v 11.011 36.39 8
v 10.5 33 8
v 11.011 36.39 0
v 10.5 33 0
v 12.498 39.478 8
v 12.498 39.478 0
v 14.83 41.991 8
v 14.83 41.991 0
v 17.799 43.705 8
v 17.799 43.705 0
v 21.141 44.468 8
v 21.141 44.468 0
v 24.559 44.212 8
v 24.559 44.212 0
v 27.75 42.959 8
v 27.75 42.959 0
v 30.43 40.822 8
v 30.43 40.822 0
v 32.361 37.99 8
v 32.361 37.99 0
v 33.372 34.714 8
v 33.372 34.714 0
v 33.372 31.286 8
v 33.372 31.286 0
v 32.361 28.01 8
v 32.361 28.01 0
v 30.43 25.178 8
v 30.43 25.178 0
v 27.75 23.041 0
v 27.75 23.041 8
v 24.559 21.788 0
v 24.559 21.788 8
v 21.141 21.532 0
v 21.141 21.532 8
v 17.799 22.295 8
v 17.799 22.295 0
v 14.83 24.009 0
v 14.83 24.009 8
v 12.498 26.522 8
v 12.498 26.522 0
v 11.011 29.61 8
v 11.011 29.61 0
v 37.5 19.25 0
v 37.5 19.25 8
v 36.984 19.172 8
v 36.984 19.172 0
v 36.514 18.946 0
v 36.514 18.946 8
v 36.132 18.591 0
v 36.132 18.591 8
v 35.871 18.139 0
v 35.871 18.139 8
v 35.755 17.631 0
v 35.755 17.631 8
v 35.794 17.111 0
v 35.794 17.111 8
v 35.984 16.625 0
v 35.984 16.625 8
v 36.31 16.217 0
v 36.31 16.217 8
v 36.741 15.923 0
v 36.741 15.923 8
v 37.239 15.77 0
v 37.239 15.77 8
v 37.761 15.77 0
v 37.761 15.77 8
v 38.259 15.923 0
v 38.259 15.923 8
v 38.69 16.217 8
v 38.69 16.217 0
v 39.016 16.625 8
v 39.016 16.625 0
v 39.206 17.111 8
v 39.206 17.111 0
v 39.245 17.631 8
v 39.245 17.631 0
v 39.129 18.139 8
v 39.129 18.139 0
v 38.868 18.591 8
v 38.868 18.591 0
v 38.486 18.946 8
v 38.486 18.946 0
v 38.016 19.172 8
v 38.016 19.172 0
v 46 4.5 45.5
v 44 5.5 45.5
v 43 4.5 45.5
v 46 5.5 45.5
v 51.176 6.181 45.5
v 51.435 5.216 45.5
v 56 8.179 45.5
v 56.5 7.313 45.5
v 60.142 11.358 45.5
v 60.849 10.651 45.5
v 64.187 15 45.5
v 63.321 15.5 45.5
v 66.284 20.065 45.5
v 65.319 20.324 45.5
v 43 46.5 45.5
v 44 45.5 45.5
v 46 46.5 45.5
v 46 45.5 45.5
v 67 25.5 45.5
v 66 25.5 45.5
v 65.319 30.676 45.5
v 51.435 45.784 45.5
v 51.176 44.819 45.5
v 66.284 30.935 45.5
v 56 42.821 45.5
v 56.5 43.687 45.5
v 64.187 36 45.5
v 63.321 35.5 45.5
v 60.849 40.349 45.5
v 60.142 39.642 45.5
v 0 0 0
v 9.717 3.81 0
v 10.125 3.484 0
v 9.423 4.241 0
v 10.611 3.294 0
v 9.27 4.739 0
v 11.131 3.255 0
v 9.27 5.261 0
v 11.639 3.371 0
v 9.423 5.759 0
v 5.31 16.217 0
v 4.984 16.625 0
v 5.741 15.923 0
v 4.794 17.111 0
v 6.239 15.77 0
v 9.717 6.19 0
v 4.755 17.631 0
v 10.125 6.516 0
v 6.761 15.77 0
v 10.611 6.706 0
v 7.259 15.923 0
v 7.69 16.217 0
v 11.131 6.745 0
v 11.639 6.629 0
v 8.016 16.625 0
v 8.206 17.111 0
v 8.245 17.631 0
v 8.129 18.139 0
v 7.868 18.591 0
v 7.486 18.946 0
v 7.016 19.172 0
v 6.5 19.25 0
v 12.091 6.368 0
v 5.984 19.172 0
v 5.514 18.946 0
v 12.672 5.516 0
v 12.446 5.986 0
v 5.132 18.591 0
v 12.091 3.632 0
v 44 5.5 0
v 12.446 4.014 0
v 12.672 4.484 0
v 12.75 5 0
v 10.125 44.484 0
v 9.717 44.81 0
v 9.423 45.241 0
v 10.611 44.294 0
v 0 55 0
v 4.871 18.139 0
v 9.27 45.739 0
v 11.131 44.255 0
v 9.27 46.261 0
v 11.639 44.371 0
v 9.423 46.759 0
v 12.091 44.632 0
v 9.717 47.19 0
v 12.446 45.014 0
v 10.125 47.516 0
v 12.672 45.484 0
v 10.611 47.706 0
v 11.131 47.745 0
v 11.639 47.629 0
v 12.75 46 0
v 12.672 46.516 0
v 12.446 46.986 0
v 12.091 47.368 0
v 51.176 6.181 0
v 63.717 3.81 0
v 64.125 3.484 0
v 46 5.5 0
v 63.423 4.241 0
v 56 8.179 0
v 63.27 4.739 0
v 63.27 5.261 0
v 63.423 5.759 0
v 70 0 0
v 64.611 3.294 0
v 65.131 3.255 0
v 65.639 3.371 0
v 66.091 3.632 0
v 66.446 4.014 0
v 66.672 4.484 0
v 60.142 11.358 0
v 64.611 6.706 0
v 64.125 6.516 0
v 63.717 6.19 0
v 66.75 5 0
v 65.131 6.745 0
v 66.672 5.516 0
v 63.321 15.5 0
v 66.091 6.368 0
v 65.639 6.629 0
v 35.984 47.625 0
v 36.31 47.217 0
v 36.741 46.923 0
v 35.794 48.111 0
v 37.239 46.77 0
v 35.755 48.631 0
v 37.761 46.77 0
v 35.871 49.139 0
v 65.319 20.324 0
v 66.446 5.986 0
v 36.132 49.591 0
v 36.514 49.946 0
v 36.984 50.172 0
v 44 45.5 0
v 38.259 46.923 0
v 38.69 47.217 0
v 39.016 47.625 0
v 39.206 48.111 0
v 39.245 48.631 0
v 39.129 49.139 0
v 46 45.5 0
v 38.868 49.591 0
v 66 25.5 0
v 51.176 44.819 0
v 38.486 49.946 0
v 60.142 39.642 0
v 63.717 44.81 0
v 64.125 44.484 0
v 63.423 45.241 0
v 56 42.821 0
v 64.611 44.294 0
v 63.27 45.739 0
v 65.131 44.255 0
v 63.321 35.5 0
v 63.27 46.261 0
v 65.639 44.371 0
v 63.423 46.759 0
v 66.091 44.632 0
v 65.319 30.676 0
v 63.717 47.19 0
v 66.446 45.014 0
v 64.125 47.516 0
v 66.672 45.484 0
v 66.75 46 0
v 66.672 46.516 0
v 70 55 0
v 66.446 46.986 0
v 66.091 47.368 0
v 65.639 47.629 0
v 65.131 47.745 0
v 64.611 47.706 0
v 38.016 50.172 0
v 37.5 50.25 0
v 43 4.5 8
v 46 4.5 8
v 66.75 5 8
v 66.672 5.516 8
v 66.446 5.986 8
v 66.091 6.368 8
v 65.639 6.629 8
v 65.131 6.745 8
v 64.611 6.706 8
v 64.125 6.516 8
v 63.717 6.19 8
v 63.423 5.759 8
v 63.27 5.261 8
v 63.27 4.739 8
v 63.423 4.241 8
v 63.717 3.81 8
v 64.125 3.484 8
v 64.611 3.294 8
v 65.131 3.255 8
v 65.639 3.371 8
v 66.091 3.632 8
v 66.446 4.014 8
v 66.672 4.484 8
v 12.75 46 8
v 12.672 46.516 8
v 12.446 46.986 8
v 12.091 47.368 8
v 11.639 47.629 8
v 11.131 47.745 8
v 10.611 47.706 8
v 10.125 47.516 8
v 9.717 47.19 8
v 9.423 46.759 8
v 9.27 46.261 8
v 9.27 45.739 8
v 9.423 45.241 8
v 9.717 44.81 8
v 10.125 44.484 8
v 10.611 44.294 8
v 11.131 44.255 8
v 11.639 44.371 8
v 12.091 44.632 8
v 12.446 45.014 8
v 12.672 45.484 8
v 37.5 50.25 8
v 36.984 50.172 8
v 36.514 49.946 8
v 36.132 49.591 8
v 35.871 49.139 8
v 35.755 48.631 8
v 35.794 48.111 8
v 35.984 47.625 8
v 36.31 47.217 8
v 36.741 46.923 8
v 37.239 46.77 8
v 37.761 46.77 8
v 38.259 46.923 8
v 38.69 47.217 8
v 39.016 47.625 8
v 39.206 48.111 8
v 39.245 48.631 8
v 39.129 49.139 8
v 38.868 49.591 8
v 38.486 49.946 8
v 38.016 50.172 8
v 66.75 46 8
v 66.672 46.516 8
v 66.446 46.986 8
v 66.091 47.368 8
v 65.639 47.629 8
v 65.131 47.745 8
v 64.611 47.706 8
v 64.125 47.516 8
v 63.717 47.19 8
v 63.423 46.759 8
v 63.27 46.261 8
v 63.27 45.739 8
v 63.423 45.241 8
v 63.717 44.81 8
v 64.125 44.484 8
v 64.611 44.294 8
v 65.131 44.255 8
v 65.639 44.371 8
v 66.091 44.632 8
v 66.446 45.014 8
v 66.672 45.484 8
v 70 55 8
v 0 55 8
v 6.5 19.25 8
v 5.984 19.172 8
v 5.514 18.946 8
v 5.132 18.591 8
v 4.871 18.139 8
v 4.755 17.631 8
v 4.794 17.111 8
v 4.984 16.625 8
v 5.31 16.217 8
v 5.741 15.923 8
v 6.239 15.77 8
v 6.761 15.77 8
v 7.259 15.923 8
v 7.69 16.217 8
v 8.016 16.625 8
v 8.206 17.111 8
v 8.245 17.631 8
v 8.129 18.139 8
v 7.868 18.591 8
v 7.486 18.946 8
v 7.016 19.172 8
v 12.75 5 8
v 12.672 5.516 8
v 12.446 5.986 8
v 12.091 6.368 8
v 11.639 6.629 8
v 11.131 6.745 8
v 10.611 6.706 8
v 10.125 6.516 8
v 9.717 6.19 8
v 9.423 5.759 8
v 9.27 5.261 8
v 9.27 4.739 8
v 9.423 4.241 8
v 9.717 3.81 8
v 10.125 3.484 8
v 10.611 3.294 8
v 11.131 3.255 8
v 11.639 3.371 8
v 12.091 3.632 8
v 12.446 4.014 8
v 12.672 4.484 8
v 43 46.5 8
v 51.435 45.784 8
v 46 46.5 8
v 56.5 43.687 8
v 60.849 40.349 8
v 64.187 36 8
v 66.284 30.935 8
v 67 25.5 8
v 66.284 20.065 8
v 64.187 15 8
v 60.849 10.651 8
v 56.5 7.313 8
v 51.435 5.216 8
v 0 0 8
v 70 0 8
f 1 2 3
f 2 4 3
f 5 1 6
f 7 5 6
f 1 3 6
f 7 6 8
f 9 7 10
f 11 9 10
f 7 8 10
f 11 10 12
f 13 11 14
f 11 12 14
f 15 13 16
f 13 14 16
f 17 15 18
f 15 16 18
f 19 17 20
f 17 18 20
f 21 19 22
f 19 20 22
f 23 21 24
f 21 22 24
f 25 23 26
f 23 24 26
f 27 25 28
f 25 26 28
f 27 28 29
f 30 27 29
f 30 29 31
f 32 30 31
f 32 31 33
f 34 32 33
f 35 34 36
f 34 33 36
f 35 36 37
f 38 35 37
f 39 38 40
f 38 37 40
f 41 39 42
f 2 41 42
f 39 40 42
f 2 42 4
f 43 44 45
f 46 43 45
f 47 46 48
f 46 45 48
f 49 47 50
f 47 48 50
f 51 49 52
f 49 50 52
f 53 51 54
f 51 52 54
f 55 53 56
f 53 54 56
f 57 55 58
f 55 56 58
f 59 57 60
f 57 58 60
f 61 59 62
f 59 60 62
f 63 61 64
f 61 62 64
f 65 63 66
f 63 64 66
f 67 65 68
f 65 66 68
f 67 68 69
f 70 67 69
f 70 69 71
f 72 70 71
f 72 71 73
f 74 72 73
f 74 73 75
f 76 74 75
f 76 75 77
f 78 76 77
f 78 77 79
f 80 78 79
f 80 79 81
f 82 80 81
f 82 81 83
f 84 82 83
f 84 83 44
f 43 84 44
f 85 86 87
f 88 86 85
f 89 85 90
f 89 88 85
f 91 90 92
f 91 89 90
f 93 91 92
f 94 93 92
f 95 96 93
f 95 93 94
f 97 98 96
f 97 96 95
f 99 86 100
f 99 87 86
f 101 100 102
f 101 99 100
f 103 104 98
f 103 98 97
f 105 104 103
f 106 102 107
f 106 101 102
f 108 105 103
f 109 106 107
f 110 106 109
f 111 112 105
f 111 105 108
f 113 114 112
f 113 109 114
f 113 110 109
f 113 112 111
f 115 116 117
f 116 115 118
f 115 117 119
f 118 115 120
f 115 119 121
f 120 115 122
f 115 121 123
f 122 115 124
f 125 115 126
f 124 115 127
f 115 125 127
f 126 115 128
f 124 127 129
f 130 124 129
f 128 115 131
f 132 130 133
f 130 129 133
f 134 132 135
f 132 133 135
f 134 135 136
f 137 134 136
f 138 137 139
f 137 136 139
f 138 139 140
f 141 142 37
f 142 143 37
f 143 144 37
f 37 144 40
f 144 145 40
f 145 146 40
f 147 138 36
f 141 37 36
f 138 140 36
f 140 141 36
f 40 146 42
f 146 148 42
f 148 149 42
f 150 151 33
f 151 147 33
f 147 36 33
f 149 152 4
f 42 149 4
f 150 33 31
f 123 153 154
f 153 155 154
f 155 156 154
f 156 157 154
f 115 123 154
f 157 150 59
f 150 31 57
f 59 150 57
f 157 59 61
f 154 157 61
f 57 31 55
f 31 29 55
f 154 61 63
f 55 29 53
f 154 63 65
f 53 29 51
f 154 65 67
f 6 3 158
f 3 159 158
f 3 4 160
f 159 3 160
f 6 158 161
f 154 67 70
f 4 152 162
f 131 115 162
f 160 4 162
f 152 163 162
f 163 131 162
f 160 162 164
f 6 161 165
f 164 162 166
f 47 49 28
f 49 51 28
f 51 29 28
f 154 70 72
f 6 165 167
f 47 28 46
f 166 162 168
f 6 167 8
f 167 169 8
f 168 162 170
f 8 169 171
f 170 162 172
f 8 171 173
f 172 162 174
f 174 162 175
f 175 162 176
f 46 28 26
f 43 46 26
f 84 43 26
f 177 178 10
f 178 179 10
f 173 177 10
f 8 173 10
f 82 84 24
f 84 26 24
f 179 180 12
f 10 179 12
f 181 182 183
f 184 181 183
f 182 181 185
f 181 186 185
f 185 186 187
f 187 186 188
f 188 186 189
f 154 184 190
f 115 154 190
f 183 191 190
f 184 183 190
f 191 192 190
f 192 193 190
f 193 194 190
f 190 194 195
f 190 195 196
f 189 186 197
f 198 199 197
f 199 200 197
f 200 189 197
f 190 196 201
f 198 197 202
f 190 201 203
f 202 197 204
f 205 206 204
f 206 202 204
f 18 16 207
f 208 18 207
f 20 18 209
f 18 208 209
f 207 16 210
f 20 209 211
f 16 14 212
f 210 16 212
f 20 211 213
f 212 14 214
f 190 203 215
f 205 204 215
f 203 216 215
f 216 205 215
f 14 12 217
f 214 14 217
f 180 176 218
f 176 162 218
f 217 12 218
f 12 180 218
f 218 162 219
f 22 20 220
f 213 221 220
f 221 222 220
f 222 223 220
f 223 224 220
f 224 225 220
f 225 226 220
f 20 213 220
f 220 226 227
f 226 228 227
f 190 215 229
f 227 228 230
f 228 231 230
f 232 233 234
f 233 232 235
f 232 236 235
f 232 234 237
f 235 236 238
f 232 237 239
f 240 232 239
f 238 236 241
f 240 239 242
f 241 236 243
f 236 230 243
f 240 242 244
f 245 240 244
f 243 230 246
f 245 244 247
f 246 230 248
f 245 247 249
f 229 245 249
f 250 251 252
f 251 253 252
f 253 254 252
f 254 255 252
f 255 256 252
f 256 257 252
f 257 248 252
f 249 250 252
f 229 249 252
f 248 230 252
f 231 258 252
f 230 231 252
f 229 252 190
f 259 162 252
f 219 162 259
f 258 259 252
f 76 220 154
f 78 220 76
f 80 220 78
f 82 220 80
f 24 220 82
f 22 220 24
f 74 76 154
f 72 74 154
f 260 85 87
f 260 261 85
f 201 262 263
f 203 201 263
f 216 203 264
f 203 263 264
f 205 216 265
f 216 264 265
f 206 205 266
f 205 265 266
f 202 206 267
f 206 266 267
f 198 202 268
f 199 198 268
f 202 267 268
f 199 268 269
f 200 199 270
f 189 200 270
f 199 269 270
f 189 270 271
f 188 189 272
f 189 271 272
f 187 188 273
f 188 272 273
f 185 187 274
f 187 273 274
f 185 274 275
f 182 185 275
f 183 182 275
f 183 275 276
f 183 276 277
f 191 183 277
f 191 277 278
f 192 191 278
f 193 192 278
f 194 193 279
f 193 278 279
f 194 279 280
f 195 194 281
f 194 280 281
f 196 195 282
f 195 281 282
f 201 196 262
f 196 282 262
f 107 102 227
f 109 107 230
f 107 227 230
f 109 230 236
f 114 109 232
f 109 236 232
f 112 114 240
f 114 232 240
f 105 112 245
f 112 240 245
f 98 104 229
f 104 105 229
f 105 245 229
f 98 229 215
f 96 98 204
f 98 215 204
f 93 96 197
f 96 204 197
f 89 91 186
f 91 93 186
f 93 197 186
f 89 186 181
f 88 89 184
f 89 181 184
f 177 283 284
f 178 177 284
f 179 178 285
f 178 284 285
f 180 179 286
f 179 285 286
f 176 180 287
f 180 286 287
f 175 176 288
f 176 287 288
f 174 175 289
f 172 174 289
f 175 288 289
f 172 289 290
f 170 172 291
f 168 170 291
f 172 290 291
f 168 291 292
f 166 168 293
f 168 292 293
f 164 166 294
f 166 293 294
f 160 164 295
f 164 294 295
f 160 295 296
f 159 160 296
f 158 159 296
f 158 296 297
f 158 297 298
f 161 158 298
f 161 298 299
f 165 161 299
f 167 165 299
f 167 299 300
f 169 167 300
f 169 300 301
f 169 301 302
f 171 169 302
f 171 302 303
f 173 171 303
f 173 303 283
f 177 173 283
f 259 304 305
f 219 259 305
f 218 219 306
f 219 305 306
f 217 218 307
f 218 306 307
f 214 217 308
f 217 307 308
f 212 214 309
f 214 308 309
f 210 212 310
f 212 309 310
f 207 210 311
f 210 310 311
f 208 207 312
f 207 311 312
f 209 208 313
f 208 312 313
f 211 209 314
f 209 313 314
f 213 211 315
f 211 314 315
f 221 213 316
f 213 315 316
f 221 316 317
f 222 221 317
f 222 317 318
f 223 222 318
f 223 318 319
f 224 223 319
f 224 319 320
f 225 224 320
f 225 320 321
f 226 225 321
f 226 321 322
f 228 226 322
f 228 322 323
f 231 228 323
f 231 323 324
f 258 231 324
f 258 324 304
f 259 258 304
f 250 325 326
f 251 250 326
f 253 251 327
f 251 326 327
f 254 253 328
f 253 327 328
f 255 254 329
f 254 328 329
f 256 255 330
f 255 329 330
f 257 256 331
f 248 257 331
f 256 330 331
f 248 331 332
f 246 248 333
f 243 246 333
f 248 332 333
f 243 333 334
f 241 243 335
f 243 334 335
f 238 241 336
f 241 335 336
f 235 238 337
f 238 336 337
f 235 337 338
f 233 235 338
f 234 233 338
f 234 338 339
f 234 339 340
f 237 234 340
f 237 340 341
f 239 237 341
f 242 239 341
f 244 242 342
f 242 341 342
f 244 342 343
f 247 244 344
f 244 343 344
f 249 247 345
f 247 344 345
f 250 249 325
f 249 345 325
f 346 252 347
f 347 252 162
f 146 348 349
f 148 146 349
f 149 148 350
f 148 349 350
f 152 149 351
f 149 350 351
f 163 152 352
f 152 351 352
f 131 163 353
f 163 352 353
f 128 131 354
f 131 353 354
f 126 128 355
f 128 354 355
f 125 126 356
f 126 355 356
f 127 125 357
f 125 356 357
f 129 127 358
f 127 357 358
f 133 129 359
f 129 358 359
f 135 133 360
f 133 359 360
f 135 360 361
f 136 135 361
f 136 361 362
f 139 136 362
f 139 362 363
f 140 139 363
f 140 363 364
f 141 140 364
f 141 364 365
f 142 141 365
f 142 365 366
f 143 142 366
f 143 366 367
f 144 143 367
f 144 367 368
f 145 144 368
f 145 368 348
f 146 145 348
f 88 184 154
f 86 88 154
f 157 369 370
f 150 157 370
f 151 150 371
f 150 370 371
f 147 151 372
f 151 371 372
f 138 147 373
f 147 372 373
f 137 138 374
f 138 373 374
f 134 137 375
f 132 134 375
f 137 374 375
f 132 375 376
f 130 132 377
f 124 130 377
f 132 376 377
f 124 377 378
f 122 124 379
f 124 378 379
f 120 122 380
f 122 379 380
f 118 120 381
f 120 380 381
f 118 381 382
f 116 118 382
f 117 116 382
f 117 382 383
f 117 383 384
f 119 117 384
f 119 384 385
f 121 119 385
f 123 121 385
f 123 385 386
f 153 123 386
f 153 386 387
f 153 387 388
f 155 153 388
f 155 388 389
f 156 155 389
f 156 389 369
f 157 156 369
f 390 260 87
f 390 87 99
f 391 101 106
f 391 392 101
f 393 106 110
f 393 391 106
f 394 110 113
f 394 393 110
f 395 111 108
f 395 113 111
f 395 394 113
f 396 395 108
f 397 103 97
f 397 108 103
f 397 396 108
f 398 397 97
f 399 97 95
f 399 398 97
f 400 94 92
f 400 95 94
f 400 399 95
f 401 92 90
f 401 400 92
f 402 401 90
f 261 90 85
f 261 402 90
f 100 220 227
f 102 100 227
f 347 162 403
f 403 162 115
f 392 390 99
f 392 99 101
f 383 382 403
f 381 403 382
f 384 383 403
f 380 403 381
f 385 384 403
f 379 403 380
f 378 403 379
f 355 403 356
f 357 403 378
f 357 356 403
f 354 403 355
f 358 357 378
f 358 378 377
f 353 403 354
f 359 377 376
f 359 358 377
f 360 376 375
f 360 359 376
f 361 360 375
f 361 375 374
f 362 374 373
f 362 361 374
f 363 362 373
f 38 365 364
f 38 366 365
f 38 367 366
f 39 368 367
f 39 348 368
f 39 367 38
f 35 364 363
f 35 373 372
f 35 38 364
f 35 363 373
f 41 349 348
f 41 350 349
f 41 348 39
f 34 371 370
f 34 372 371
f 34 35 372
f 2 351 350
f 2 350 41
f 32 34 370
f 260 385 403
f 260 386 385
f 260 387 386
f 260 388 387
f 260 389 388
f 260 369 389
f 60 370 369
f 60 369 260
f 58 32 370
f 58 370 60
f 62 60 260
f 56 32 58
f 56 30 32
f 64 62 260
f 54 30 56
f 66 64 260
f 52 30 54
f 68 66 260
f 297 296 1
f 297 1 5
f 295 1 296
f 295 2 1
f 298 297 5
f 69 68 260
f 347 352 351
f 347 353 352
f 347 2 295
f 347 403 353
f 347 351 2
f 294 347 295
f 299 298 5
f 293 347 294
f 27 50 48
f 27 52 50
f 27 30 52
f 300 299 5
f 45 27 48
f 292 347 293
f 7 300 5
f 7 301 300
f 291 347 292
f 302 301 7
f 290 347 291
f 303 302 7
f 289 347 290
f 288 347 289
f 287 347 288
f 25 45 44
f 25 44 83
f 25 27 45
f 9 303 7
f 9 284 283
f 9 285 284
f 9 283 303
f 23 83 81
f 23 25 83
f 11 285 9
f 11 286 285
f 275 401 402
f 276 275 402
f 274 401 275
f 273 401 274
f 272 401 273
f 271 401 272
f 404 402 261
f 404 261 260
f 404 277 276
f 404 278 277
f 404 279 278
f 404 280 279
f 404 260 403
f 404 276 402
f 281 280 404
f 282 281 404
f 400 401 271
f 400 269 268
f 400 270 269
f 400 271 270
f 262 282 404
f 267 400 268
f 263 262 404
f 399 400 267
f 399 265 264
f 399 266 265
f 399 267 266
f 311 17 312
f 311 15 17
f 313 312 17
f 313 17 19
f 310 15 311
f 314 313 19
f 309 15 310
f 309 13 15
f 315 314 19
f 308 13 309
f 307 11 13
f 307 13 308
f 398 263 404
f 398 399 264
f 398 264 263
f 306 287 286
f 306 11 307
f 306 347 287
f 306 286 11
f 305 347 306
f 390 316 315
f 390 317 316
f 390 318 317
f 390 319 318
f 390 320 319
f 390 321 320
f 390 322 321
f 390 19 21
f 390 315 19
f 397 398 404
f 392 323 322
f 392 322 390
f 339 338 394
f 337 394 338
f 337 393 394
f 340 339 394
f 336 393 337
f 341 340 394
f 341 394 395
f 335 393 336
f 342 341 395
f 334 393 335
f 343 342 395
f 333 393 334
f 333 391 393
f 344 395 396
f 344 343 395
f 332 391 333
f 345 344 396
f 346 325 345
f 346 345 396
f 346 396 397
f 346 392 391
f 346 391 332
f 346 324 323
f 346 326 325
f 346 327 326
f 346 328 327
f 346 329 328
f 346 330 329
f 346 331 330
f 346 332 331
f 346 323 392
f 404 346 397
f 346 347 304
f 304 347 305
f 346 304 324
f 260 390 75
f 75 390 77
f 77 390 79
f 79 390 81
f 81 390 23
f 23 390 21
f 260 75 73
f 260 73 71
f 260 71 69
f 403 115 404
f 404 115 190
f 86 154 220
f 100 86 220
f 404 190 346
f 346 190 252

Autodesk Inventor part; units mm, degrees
ref_plane "YZ Plane" through (0, 0, 0) normal (1, 0, 0) x (0, 1, 0)
ref_plane "XZ Plane" through (0, 0, 0) normal (0, 1, 0) x (-1, 0, 0)
ref_plane "XY Plane" through (0, 0, 0) normal (0, 0, 1) x (1, 0, 0)
sketch "Sketch1" plane through (0, 0, 0) normal (0, 0, 1) x (1, 0, 0)
  line L0 (0, 0) -> (70, 0)
  line L1 (70, 0) -> (70, 55)
  line L2 (70, 55) -> (0, 55)
  line L3 (0, 55) -> (0, 0)
  dimension "d0" = 70
  dimension "d1" = 55
extrude "Extrusion1" add sketch "Sketch1" along normal blind 8
sketch "Sketch2" plane through (0, 0, 8) normal (0, 0, 1) x (1, 0, 0)
  circle A0 centre (11, 5) radius 1.75
  circle A1 centre (65, 5) radius 1.75
  circle A2 centre (11, 46) radius 1.75
  circle A3 centre (65, 46) radius 1.75
  line L0 (0, 55) -> (0, 0) projected
  line L1 (0, 0) -> (70, 0) projected
  line L2 (70, 55) -> (0, 55) projected
  line L3 (70, 0) -> (70, 55) projected
  dimension "d4" = 3.5
  dimension "d5" = 3.5
  dimension "d6" = 3.5
  dimension "d7" = 3.5
  dimension "d8" = 11
  dimension "d9" = 5
  dimension "d10" = 9
  dimension "d11" = 5
extrude "Extrusion2" cut sketch "Sketch2" against normal blind 40 contours A0 | A1 | A2 | A3
sketch "Sketch3" plane through (0, 0, 0) normal (0, 0, -1) x (-1, 0, 0)
  circle A0 centre (-22, 33) radius 11.5
  line L0 (0, 55) -> (0, 0) projected
  line L1 (-70, 55) -> (0, 55) projected
  dimension "d14" = 23
  dimension "d15" = 22
  dimension "d16" = 22
extrude "Extrusion3" cut sketch "Sketch3" against normal blind 35
sketch "Sketch4" plane through (0, 0, 0) normal (0, 0, -1) x (-1, 0, 0)
  circle A0 centre (-22, 33) radius 11.5 projected
  point P0 (0, 0)
  point P1 (-6.5, 48.5)
  point P2 (-37.5, 48.5)
  point P3 (-37.5, 17.5)
  point P4 (-6.5, 17.5)
  dimension "d19" = 15.5
  dimension "d20" = 15.5
  dimension "d21" = 15.5
  dimension "d22" = 15.5
hole "Hole1" at (6.5, 17.5, 0) at (37.5, 17.5, 0) at (37.5, 48.5, 0) direction (0, 0, 1) diameter 3.5 end through all
sketch "Sketch5" plane through (0, 0, 0) normal (0, 0, -1) x (-1, 0, 0)
  arc A0 (-46, 45.5) -> (-46, 5.5) centre (-46, 25.5) ccw
  line L0 (-46, 45.5) -> (-44, 45.5)
  line L1 (-44, 45.5) -> (-44, 5.5)
  line L2 (-44, 5.5) -> (-46, 5.5)
  line L3 (-70, 0) -> (-70, 55) projected
  point P0 (0, 0)
  dimension "d30" = 40
  dimension "d32" = 25.5
  dimension "d33" = 24
  dimension "d34" = 26
extrude "Extrusion4" cut sketch "Sketch5" against normal blind 35
sketch "Sketch6" plane through (0, 0, 8) normal (0, 0, 1) x (1, 0, 0)
  arc A0 (46, 5.5) -> (46, 45.5) centre (46, 25.5) ccw projected
  line L0 (46, 5.5) -> (44, 5.5) projected
  line L1 (44, 5.5) -> (44, 45.5) projected
  line L2 (44, 45.5) -> (46, 45.5) projected
  arc A1 (46, 4.5) -> (46, 46.5) centre (46, 25.5) ccw
  line L3 (46, 4.5) -> (43, 4.5)
  line L4 (43, 4.5) -> (43, 46.5)
  line L5 (43, 46.5) -> (46, 46.5)
  line L6 (70, 0) -> (70, 55) projected
  point P0 (0, 0)
  dimension "d37" = 42
  dimension "d38" = 27
extrude "Extrusion5" add sketch "Sketch6" along normal blind 37.5
equation "\"d5\" = d4"
equation "\"d6\" = d4"
equation "\"d7\" = d4"
equation "\"d20\" = d19"
equation "\"d21\" = d19"
equation "\"d22\" = d19"
properties part number "BLOQUE_PARA_MOTOR"
